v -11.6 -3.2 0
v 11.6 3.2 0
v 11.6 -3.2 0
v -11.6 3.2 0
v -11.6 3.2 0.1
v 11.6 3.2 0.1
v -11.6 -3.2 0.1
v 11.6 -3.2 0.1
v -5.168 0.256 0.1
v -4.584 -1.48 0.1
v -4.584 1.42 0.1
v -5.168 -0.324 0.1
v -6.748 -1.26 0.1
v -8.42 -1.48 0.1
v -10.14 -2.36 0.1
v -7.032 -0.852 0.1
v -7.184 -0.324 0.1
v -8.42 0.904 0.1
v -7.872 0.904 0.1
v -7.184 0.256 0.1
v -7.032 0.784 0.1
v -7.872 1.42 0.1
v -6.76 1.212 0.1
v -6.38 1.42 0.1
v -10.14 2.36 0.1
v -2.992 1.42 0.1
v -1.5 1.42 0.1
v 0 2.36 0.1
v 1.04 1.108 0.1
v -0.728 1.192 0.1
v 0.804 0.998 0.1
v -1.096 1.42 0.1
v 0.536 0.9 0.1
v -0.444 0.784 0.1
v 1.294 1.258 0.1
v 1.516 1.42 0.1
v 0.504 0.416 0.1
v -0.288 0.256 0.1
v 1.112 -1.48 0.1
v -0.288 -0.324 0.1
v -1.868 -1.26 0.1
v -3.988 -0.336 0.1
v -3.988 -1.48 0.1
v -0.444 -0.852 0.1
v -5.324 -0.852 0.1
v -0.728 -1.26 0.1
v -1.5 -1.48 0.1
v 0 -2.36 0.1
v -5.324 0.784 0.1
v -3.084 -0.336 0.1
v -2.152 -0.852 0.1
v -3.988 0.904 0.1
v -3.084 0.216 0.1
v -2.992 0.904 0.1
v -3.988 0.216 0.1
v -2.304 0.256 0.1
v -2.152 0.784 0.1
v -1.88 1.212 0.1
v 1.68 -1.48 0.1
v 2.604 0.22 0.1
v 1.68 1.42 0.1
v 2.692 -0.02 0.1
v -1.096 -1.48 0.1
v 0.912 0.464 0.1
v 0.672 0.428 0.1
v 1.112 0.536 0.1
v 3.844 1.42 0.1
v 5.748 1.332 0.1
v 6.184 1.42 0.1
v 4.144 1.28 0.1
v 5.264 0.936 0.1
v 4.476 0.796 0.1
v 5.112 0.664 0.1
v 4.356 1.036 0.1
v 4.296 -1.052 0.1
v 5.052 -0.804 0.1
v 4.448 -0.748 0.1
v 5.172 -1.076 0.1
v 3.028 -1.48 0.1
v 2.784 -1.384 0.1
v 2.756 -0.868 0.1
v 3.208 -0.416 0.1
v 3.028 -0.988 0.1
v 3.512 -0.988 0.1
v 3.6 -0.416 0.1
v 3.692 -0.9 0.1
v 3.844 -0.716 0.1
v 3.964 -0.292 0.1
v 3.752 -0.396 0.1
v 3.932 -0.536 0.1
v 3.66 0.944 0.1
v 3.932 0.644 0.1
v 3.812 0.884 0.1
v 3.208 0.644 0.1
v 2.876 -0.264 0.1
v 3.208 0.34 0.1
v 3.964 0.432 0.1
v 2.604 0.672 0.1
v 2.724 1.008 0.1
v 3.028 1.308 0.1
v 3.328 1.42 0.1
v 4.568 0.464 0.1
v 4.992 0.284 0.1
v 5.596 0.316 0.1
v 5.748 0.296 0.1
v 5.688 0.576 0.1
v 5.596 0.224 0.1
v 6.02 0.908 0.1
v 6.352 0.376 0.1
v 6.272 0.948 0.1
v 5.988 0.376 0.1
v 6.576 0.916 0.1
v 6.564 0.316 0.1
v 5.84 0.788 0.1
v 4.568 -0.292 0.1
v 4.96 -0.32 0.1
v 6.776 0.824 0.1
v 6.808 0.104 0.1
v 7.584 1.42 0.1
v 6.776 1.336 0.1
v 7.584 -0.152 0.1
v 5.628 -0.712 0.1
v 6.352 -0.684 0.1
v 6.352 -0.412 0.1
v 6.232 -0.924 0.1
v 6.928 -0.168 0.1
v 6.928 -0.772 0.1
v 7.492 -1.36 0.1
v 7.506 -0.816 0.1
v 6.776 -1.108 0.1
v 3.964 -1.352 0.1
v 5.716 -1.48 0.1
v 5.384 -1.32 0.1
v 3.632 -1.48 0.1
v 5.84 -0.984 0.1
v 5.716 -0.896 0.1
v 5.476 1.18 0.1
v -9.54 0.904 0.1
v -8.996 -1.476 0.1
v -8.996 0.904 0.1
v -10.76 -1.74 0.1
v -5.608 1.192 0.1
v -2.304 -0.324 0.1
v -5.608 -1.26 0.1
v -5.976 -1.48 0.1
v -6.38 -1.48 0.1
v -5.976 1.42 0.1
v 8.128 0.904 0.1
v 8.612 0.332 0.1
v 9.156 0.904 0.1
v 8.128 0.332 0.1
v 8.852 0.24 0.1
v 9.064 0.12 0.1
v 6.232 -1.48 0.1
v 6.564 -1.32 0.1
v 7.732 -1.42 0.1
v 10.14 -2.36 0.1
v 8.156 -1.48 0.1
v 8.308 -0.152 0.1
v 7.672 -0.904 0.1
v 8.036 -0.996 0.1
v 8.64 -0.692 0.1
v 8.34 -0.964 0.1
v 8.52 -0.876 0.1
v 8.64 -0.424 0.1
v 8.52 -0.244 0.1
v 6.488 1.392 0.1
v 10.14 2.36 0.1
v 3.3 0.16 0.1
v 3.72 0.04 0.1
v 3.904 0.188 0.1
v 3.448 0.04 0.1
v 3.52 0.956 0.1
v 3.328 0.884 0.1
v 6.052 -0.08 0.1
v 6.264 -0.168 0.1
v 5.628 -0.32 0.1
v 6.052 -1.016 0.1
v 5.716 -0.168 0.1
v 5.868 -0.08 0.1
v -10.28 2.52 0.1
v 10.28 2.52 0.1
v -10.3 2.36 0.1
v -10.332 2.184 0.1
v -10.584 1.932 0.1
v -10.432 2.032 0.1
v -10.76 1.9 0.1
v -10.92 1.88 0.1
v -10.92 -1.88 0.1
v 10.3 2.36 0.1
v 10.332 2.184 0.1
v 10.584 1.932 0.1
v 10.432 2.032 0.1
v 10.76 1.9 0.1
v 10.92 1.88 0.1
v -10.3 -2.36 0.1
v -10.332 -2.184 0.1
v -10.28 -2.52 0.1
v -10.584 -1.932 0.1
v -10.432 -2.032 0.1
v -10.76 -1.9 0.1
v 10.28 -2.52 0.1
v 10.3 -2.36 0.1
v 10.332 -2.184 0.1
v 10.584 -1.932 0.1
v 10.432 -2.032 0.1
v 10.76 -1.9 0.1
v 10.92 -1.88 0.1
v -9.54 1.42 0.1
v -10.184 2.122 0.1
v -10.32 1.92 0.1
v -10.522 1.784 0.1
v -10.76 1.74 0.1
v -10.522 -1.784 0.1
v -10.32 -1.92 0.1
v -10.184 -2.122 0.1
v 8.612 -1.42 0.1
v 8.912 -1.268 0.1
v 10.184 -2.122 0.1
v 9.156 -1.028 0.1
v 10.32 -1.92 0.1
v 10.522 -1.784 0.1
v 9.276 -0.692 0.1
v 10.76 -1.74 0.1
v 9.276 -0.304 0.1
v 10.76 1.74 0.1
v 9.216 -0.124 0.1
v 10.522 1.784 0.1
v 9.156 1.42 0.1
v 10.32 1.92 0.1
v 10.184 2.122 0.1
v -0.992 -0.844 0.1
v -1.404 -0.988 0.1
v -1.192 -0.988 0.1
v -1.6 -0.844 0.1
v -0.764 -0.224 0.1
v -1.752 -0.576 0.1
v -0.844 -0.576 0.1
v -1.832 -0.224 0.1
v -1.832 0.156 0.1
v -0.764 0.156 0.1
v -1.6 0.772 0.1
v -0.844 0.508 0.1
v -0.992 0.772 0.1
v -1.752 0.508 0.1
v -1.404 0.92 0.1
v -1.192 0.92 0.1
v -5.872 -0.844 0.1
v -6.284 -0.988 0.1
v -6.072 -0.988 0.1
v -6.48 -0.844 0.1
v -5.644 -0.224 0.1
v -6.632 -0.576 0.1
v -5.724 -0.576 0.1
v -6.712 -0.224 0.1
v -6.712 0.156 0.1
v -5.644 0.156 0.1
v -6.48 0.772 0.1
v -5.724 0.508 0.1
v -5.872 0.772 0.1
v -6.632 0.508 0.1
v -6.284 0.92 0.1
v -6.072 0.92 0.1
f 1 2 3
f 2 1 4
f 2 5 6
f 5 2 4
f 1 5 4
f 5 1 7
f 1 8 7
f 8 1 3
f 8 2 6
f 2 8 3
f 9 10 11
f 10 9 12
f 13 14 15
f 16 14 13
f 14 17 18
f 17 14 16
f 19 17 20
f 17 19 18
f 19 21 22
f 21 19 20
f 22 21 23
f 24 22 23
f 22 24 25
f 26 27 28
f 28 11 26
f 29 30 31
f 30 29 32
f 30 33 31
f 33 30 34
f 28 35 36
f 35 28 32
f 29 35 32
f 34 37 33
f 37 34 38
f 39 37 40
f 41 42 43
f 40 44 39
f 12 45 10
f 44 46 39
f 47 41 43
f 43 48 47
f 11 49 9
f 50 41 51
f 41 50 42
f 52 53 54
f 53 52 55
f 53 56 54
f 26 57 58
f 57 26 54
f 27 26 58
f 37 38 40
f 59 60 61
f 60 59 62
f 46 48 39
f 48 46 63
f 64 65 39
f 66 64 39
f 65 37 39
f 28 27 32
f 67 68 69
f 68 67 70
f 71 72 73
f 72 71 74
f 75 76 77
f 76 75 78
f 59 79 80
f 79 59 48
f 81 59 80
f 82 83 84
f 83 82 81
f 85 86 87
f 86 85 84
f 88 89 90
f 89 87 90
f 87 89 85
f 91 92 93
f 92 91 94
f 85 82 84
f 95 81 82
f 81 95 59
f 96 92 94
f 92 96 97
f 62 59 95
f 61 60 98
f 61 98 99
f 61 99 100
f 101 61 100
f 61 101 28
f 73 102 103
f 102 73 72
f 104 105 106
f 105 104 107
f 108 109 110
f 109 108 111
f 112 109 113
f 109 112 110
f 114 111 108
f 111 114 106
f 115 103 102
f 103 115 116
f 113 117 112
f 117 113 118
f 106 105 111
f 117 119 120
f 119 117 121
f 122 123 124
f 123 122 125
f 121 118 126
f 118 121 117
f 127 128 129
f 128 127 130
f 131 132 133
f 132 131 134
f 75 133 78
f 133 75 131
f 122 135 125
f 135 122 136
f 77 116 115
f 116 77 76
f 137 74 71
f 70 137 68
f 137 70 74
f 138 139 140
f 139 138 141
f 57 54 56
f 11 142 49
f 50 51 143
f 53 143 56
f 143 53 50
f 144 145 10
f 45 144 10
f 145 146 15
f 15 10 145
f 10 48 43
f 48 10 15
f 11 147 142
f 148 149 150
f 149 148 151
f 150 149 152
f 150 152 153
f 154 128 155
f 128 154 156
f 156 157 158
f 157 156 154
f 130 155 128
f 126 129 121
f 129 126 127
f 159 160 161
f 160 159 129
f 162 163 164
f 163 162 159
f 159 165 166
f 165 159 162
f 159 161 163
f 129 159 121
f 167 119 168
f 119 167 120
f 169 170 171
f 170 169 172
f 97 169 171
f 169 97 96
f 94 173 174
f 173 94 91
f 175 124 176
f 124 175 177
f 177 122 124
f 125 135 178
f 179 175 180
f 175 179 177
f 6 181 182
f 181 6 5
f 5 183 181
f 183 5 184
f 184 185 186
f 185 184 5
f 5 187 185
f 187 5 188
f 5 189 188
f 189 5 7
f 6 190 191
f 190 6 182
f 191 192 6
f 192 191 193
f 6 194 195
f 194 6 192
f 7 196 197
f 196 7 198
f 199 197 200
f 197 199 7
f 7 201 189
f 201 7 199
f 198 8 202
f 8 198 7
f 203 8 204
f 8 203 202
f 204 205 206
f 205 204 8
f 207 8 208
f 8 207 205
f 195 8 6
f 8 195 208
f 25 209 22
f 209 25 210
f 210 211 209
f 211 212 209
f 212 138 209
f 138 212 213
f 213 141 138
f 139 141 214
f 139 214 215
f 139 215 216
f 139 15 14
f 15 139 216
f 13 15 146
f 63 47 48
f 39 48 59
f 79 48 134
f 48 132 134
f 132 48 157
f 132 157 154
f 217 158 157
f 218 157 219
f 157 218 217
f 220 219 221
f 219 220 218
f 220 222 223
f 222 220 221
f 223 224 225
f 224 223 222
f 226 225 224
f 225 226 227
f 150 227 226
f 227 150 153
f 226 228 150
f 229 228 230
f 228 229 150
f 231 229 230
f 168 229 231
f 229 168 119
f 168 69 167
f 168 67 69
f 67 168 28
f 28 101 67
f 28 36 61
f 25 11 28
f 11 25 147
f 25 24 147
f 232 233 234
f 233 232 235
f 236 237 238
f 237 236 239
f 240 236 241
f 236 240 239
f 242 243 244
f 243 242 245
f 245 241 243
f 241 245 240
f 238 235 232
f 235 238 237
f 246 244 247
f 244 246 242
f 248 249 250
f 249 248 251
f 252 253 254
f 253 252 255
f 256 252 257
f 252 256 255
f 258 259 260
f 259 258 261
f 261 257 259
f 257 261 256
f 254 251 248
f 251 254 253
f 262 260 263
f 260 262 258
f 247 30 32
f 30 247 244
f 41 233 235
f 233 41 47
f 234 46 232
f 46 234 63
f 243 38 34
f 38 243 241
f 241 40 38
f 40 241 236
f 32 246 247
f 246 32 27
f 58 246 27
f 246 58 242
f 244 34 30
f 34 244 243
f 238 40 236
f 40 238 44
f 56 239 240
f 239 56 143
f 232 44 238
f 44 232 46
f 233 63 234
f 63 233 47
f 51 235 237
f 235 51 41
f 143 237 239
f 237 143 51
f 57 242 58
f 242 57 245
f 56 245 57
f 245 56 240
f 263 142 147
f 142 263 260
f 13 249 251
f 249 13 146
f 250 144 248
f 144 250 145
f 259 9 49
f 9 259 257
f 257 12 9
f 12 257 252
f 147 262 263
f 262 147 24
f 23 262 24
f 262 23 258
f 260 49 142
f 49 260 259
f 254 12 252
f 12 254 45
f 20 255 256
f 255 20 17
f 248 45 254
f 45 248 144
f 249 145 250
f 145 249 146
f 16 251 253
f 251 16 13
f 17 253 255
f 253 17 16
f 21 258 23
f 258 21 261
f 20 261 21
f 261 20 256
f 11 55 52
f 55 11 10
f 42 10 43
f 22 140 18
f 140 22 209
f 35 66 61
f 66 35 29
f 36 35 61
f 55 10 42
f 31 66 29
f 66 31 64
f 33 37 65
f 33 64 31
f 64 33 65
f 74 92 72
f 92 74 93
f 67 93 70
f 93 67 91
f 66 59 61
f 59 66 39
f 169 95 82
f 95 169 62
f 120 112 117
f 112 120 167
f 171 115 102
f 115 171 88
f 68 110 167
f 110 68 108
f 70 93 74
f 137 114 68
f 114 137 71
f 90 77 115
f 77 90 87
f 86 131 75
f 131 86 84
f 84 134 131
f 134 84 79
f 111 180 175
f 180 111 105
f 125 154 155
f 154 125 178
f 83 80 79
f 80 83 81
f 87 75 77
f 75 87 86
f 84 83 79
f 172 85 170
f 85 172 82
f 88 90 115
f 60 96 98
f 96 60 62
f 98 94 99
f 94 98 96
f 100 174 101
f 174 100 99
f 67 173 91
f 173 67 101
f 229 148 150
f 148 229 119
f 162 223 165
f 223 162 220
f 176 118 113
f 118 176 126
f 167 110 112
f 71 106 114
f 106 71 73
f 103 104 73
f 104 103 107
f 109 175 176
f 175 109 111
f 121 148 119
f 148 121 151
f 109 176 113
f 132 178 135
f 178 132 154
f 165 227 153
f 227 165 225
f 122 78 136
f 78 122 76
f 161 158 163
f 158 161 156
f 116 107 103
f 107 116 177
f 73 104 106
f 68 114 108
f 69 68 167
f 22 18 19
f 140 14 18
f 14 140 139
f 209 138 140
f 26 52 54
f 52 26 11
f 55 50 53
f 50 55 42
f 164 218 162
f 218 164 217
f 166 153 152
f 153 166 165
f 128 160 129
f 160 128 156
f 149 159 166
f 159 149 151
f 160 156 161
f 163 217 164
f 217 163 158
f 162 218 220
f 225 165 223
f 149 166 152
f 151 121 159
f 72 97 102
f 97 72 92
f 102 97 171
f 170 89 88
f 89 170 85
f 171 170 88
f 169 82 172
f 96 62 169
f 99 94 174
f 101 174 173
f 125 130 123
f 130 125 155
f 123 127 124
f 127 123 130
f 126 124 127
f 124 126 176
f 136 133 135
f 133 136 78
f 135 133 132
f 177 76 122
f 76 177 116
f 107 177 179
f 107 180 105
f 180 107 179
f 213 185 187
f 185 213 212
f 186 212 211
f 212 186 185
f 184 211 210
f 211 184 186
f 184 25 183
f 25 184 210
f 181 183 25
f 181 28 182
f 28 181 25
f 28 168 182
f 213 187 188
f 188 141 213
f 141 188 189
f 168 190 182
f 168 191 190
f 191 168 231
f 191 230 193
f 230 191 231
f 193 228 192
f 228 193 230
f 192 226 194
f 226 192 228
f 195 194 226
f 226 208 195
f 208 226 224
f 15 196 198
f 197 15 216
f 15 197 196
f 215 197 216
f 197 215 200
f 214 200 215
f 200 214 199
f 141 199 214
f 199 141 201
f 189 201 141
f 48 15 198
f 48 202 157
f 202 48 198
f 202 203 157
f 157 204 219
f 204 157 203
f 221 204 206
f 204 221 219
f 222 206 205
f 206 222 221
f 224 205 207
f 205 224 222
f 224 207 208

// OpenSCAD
// file: ../p/box5-12.scad
use <../lib.scad>
function ldraw_lib__box5_12() = [
// 0 Box with 5 Faces without Any Edges
// 0 Name: box5-12.dat
// 0 Author: Chris Dee [cwdee]
// 0 !LDRAW_ORG Primitive UPDATE 2009-02
// 0 !LICENSE Licensed under CC BY 4.0 : see CAreadme.txt
// 
// 0 BFC CERTIFY CCW
  [0,"BFC","CERTIFY"],
  [0,"BFC","CCW"],
// 
// 0 !HISTORY 2009-09-03 [PTadmin] Official Update 2009-02
// 
// 
// 4 16 1 1 1 1 1 -1 -1 1 -1 -1 1 1
  [4,16,1,1,1,1,1,-1,-1,1,-1,-1,1,1],
// 4 16 -1 0 1 1 0 1 1 1 1 -1 1 1
  [4,16,-1,0,1,1,0,1,1,1,1,-1,1,1],
// 4 16 -1 0 -1 -1 0 1 -1 1 1 -1 1 -1
  [4,16,-1,0,-1,-1,0,1,-1,1,1,-1,1,-1],
// 4 16 1 0 -1 -1 0 -1 -1 1 -1 1 1 -1
  [4,16,1,0,-1,-1,0,-1,-1,1,-1,1,1,-1],
// 4 16 1 0 1 1 0 -1 1 1 -1 1 1 1
  [4,16,1,0,1,1,0,-1,1,1,-1,1,1,1],
// 0
];
module ldraw_lib__box5_12(step=0, col=false, unit=2/5, alt=false, line=0.2, solid=!$preview)
    makepoly(ldraw_lib__box5_12(), step=step, col=col, unit=unit, alt=alt, line=line, solid=solid);
ldraw_lib__box5_12(line=0.2);
// main file
use <../lib.scad>
use <6296256l.scad>
function ldraw_lib__6372023l() = [
// 0 =Sticker  0.8 x  2.9 with "TOFO 1965" Licence Plate
// 0 Name: 6372023l.dat
// 0 Author: Magnus Forsberg [MagFors]
// 0 !LDRAW_ORG Part Alias UPDATE 2024-06
// 0 !LICENSE Licensed under CC BY 4.0 : see CAreadme.txt
// 
// 0 BFC CERTIFY CCW
  [0,"BFC","CERTIFY"],
  [0,"BFC","CCW"],
// 
// 0 !KEYWORDS 500, Bricklink 77942stk01, Brickowl 1064764, Cinquecento, FIAT
// 0 !KEYWORDS Nuova, Rebrickable 83460, set 77942
// 
// 0 !HISTORY 2024-07-29 [OrionP] Official Update 2024-06
// 
// 
// 1 16 0 0 0 1 0 0 0 1 0 0 0 1 6296256l.dat
  [1,16,0,0,0,1,0,0,0,1,0,0,0,1, ldraw_lib__6296256l()],
];
module ldraw_lib__6372023l(step=0, col=false, unit=2/5, alt=false, line=0.2, solid=!$preview)
    makepoly(ldraw_lib__6372023l(), step=step, col=col, unit=unit, alt=alt, line=line, solid=solid);
ldraw_lib__6372023l(line=0.2);
